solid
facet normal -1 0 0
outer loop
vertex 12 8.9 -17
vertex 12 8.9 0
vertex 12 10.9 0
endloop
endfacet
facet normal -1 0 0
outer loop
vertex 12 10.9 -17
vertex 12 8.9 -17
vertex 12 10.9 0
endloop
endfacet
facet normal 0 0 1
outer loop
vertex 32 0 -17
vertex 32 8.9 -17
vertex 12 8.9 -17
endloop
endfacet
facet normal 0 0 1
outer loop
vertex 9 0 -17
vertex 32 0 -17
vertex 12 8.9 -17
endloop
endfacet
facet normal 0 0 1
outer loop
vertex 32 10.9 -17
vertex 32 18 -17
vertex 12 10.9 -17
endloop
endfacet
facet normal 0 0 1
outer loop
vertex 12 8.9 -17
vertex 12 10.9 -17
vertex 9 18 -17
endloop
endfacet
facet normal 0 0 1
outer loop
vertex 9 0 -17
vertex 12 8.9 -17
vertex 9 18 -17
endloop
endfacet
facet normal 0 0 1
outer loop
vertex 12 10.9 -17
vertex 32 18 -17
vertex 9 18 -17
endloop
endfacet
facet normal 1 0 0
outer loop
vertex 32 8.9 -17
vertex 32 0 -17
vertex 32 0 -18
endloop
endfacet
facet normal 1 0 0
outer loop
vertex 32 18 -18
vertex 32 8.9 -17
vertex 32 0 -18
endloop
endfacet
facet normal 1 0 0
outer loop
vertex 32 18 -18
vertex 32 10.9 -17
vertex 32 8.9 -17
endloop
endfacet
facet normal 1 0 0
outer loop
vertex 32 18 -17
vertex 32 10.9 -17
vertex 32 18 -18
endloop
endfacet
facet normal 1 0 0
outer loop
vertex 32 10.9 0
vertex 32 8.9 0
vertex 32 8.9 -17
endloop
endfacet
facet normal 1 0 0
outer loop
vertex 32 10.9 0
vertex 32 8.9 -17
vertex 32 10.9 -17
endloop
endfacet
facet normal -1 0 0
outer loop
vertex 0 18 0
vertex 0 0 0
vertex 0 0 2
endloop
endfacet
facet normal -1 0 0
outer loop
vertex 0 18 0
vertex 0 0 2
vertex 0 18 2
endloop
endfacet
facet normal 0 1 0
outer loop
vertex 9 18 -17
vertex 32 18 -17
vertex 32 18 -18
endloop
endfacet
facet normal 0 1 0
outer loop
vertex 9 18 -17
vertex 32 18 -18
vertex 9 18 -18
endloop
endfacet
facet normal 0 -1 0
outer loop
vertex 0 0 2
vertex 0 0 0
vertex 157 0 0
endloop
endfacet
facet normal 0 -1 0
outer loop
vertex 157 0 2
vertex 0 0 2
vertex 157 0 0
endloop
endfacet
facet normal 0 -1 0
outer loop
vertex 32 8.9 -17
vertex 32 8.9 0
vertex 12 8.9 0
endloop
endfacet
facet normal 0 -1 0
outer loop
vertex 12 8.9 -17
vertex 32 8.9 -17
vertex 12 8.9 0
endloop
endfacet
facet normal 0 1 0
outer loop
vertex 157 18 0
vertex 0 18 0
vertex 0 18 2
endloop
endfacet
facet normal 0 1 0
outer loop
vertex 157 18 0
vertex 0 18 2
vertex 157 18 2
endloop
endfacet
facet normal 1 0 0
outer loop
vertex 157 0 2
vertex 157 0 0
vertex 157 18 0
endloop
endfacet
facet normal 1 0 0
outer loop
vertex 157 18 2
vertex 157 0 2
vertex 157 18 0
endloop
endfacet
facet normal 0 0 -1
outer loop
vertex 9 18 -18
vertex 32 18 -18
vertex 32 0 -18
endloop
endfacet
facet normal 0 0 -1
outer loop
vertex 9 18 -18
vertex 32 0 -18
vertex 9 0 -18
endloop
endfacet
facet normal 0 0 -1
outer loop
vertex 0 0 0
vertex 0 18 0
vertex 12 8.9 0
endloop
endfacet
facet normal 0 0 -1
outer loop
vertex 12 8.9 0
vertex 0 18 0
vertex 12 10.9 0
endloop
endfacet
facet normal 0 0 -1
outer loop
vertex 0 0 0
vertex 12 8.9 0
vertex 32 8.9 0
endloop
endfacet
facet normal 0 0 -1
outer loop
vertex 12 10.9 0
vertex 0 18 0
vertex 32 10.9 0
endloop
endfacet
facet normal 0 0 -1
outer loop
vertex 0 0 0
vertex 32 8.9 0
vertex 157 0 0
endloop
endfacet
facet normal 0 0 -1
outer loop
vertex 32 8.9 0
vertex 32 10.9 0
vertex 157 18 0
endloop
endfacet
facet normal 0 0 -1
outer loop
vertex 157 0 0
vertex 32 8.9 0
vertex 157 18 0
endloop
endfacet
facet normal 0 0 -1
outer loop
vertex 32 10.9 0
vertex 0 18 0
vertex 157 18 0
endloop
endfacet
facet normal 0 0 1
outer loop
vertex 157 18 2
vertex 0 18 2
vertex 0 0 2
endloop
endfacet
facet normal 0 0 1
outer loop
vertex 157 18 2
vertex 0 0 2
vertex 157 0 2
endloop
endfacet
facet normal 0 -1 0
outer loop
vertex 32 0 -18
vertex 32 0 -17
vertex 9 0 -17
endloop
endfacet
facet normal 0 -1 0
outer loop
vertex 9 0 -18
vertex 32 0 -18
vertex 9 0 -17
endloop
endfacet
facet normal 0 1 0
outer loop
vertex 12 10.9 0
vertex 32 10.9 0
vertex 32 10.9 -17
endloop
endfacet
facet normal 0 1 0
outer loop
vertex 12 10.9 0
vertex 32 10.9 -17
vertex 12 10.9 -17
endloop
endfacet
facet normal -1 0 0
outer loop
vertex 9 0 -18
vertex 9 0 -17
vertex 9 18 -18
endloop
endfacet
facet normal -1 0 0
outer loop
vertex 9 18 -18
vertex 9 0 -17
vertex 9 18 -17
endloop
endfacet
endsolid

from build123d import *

# Parameters (mm, degrees)
SKETCH1_W           = 157
SKETCH1_H           = 18
BOSS_EXTRUDE1_DEPTH = 2
SKETCH2_W           = 20
SKETCH2_H           = 2
BOSS_EXTRUDE2_DEPTH = 17
SKETCH3_W           = 23
SKETCH3_H           = 18
BOSS_EXTRUDE3_DEPTH = 1


with BuildPart() as part:
    # Sketch1 → Boss-Extrude1 (new body)
    with BuildSketch(Plane.XY):
        with Locations((78.5, 9)):
            Rectangle(SKETCH1_W, SKETCH1_H)
    extrude(amount=BOSS_EXTRUDE1_DEPTH)

    # Sketch2 → Boss-Extrude2 (add)
    with BuildSketch(Plane(origin=(0, 0, 0), x_dir=(-1, 0, 0), z_dir=(0, 0, -1))):
        with Locations((-22, 9.9)):
            Rectangle(SKETCH2_W, SKETCH2_H)
    extrude(amount=BOSS_EXTRUDE2_DEPTH)

    # Sketch3 → Boss-Extrude3 (add)
    with BuildSketch(Plane(origin=(0, 0, -17), x_dir=(-1, 0, 0), z_dir=(0, 0, -1))):
        with Locations((-20.5, 9)):
            Rectangle(SKETCH3_W, SKETCH3_H)
    extrude(amount=BOSS_EXTRUDE3_DEPTH)


solid = part.part
